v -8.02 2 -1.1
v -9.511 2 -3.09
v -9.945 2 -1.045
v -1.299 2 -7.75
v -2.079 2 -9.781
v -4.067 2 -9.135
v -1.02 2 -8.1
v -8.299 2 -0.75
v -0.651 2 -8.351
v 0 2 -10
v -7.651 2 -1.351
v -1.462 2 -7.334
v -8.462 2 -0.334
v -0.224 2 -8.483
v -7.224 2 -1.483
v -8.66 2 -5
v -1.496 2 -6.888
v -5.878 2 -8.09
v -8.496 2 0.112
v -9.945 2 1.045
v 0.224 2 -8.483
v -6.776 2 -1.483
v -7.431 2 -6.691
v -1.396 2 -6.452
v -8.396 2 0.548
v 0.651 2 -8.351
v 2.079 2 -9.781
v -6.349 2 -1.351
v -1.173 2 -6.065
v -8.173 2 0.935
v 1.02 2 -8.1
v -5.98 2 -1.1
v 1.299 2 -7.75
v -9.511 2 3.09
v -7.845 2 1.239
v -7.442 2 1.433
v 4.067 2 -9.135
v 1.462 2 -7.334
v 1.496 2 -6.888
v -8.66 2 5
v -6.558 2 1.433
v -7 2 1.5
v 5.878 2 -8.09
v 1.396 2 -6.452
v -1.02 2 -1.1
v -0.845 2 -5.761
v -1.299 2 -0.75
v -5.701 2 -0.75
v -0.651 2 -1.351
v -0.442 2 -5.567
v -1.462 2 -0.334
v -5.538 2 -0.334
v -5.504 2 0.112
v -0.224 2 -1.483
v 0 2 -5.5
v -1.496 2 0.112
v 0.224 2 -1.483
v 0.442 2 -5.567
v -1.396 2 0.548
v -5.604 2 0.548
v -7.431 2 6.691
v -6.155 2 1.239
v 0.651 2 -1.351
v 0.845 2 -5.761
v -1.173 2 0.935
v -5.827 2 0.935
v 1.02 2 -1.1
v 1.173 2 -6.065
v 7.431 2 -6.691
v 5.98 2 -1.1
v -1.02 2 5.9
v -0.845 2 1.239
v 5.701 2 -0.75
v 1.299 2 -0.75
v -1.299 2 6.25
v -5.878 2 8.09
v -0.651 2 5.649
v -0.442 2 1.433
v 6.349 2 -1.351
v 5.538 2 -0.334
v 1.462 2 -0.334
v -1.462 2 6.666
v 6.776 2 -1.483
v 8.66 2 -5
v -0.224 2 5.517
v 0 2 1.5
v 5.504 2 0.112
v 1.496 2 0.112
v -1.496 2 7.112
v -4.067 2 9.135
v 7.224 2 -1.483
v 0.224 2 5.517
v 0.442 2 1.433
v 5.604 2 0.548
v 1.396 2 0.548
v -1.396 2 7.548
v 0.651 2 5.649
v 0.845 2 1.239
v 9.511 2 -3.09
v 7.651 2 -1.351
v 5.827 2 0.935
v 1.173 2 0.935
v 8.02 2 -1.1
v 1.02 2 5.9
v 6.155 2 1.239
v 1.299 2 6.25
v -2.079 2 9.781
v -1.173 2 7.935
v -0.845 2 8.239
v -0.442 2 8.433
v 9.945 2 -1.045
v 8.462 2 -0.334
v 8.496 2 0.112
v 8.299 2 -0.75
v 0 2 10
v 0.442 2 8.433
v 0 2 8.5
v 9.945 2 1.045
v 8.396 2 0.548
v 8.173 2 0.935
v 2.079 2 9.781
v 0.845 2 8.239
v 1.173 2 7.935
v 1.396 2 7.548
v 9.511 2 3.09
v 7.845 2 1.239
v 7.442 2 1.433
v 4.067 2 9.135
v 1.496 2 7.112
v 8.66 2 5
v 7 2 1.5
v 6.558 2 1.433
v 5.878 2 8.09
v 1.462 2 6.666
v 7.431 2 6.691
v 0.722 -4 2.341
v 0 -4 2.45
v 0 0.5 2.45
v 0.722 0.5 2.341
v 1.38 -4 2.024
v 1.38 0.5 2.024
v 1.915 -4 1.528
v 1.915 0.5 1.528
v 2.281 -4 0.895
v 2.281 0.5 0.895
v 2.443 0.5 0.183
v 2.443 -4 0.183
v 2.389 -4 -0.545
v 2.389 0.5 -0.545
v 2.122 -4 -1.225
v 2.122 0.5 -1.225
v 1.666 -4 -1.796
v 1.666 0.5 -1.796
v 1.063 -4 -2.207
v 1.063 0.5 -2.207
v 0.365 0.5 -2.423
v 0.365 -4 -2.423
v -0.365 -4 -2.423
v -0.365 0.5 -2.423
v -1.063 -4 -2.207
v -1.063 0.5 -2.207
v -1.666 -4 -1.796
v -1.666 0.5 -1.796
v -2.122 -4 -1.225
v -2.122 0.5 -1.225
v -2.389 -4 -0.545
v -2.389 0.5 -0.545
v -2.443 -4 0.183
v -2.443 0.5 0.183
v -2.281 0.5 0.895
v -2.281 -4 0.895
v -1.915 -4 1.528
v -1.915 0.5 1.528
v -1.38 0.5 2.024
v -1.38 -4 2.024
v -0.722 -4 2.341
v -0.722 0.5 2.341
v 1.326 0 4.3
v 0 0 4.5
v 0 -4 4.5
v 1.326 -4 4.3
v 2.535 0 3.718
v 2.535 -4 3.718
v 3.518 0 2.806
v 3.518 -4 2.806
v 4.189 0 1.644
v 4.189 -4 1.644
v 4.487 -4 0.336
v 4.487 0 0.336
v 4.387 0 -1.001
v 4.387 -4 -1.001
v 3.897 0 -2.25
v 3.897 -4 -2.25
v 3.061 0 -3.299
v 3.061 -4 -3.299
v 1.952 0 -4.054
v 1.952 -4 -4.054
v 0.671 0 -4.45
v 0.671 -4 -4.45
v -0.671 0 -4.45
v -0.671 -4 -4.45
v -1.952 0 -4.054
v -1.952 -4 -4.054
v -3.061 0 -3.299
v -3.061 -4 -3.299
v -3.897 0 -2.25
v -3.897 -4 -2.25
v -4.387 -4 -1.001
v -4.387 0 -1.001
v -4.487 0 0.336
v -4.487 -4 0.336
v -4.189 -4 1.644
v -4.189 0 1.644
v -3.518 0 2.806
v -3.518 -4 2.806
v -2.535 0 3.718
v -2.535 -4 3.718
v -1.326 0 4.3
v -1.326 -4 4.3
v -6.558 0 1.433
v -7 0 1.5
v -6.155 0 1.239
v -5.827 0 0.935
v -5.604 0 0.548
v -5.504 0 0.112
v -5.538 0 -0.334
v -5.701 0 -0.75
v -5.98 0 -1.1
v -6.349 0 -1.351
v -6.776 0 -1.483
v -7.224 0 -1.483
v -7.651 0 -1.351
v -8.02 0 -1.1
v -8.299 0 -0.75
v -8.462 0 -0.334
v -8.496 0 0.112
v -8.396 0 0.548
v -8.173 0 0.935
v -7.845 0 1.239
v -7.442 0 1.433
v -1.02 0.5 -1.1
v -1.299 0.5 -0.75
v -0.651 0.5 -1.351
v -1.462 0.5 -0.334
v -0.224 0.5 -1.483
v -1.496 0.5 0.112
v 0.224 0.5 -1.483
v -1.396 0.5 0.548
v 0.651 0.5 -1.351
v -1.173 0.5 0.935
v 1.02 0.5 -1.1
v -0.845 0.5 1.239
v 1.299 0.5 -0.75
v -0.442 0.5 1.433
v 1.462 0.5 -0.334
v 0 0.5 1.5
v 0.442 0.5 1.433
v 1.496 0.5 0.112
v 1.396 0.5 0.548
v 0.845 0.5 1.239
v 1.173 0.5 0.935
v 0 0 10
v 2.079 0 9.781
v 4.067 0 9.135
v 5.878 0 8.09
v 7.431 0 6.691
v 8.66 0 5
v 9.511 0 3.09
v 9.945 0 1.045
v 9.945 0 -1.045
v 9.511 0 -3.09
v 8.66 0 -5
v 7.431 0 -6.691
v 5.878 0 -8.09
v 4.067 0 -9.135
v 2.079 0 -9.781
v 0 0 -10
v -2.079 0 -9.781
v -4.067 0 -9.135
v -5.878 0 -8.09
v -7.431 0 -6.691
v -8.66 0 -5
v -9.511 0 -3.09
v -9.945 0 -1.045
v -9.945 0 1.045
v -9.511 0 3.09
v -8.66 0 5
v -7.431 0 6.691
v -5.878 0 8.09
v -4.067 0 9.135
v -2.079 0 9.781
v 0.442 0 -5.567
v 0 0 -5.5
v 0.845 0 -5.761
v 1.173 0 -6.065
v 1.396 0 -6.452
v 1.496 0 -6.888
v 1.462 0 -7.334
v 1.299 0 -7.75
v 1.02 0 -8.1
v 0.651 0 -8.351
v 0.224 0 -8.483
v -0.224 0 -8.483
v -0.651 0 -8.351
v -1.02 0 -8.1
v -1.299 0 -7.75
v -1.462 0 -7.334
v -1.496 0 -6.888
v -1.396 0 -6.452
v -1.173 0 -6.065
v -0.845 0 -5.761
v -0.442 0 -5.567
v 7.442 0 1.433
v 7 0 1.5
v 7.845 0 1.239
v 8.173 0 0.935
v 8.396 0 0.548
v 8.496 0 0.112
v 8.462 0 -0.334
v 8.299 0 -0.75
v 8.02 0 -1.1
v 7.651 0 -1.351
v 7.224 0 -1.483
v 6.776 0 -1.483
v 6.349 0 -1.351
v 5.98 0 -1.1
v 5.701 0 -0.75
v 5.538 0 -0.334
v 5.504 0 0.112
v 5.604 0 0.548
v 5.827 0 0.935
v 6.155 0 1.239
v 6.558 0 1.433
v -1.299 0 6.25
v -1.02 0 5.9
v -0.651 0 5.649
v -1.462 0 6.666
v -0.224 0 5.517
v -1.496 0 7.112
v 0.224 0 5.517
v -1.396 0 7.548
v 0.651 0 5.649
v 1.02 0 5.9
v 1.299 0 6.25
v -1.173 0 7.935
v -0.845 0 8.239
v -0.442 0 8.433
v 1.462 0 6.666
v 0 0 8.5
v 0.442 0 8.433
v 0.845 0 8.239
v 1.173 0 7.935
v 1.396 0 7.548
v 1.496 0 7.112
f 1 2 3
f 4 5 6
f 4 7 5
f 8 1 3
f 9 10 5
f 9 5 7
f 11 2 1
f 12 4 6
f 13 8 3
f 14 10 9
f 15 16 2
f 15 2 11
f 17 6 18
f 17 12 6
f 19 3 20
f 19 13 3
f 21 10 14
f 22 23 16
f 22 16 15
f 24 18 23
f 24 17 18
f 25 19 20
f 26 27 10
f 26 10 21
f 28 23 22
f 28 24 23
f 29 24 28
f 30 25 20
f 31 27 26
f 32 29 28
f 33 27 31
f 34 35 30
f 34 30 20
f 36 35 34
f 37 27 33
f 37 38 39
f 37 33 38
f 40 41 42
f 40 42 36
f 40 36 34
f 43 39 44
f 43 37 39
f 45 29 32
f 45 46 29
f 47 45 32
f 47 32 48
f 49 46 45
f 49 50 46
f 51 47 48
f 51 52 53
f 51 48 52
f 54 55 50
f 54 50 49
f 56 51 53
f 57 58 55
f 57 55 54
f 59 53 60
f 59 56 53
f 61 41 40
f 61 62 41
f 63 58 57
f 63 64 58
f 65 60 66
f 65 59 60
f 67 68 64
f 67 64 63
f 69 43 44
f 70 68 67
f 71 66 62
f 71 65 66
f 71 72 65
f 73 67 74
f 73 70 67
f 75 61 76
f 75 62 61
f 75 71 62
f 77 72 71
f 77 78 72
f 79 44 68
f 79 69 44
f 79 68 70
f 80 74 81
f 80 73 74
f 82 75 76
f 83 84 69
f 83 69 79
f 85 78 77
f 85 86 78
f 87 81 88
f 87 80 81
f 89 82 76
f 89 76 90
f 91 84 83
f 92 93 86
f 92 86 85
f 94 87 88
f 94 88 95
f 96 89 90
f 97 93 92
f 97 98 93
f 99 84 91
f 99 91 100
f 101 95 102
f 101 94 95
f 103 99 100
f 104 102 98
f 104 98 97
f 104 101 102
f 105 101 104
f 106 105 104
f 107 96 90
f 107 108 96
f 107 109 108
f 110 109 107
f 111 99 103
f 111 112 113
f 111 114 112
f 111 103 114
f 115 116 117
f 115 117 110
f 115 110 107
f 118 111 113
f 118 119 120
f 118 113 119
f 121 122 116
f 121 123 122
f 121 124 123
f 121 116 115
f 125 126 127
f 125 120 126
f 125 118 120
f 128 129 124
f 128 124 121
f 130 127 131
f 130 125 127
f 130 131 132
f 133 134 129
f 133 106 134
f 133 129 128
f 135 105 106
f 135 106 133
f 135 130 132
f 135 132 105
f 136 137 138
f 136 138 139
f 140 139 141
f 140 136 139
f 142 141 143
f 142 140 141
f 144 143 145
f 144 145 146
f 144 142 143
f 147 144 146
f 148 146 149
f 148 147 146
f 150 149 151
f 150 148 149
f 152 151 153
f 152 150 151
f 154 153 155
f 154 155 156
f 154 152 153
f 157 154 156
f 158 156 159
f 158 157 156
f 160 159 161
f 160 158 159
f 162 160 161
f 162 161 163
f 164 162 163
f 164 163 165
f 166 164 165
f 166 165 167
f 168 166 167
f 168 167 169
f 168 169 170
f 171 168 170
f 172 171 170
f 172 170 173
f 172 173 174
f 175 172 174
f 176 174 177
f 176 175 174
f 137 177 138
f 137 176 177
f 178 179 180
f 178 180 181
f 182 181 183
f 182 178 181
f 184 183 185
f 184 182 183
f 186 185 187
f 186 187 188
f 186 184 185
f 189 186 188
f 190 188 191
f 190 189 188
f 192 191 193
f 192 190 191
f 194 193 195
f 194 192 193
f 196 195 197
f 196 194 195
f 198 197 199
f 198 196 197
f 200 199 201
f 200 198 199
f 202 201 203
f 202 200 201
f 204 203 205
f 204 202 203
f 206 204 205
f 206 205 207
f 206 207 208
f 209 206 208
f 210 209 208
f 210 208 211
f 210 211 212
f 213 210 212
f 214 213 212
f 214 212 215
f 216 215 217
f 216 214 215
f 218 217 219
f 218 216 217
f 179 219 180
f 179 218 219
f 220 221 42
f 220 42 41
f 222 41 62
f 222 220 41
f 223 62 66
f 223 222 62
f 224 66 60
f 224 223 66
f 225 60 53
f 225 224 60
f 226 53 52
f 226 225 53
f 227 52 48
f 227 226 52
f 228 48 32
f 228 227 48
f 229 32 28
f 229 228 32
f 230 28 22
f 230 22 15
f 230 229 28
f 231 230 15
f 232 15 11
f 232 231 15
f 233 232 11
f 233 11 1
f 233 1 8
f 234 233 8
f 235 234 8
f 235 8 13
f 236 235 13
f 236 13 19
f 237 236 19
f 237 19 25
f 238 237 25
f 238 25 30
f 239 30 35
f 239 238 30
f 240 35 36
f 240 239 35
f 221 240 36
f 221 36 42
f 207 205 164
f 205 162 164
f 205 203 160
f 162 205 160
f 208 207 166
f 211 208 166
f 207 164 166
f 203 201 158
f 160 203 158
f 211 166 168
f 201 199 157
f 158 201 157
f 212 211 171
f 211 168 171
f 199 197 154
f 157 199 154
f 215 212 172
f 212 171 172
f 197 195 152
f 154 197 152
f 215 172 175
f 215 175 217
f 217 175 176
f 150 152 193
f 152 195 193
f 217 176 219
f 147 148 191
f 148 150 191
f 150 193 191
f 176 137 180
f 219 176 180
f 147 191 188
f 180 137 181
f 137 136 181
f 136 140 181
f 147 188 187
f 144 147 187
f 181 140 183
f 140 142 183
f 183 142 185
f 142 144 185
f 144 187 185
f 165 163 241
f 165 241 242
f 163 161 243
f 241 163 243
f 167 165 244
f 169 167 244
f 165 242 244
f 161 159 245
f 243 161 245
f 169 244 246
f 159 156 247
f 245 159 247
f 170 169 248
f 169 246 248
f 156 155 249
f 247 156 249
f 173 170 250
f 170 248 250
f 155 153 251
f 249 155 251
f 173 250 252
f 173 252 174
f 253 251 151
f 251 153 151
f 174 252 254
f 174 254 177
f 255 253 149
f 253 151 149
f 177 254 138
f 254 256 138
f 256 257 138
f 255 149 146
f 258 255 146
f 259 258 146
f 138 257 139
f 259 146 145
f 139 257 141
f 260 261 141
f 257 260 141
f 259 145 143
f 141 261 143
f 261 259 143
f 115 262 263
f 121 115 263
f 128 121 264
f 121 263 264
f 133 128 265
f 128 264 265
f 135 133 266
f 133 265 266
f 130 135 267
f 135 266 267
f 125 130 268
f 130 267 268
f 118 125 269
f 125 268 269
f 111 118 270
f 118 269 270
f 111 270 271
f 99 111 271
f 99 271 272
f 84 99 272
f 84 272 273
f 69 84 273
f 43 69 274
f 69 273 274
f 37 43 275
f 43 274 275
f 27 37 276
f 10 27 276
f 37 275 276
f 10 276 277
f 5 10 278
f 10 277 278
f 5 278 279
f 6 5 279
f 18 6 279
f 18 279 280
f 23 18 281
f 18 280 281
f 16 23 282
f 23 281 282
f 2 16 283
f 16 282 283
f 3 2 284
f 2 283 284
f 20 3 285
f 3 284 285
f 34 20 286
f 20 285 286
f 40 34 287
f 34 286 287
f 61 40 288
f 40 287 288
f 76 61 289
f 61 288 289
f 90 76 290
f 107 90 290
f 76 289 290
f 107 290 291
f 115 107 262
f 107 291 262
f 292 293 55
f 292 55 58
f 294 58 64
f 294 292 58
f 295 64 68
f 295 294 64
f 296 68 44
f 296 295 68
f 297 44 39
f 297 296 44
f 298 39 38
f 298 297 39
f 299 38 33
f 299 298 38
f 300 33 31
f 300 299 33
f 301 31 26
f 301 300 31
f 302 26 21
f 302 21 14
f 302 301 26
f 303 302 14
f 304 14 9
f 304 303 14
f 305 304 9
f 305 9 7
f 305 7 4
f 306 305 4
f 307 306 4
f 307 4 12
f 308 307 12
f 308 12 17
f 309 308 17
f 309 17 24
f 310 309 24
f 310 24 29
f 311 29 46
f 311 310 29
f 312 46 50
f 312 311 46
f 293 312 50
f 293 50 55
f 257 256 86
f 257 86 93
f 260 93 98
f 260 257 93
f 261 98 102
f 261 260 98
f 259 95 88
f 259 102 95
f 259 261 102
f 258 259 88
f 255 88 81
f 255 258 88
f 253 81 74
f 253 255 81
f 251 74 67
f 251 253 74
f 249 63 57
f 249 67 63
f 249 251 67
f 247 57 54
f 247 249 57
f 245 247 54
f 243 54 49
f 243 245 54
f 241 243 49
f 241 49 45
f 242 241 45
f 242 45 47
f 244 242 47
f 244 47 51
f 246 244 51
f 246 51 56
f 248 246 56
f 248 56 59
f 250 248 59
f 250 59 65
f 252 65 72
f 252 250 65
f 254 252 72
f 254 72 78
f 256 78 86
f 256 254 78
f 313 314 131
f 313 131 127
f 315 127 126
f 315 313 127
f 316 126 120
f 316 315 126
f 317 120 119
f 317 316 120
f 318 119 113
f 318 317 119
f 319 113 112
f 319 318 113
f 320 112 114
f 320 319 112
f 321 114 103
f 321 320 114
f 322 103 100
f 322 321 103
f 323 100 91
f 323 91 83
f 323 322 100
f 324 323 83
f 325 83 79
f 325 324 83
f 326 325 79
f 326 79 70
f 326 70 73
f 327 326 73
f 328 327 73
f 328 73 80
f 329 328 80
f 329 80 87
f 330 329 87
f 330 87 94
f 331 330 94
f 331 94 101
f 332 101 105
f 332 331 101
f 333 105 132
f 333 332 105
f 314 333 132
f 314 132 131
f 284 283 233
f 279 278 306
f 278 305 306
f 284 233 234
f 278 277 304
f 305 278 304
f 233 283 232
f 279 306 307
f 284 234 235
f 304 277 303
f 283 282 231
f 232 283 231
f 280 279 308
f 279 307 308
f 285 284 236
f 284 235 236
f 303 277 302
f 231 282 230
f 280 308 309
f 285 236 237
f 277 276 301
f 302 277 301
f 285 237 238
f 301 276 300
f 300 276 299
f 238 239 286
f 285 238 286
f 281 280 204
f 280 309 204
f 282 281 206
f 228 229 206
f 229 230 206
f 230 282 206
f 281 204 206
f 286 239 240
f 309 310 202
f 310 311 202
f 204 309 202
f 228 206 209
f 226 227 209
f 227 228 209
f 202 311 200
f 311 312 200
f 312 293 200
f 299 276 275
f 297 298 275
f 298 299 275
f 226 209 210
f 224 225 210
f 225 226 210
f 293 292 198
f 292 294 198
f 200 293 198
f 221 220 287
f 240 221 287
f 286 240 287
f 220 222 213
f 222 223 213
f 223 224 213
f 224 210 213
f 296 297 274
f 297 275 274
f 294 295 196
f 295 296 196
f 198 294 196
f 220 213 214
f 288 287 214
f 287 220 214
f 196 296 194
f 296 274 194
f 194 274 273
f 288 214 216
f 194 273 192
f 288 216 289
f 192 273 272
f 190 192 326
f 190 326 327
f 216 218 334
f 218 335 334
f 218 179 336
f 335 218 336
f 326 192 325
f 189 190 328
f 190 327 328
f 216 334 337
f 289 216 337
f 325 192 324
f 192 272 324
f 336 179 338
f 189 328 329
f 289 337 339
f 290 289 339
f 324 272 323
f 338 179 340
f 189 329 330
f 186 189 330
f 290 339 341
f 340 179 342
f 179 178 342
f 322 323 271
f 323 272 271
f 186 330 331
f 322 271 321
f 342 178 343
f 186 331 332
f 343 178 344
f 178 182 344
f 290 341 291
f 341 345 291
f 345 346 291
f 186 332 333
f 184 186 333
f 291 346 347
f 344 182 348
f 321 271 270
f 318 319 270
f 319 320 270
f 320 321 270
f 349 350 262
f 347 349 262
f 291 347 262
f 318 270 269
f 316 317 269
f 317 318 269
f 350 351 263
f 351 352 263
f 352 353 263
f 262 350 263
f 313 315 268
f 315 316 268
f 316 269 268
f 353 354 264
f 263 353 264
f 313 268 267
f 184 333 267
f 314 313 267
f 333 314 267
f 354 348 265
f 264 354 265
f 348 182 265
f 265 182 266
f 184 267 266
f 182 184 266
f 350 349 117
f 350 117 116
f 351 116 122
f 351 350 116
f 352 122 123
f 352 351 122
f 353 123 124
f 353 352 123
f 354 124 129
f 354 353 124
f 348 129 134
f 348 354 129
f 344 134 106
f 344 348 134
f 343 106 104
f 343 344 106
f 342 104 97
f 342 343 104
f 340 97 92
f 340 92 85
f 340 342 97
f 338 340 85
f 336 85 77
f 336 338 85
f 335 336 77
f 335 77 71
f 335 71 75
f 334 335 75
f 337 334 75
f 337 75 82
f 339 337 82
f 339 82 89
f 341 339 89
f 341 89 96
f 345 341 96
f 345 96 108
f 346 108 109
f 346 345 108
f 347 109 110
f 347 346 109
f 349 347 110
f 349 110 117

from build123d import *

# Parameters (mm, degrees)
SKETCH_1_R               = 10
SKETCH_1_R_2             = 1.5
EXTRUDE_1_DEPTH          = 2
SKETCH_2_R               = 4.5
EXTRUDE_2_DEPTH          = 4
CUT_EXTRUDE_1_DEPTH      = 15.696938457
CUT_EXTRUDE_1_DEPTH_BACK = 15.696938457
SKETCH_3_R               = 1.5
CUT_EXTRUDE_START        = -4
SKETCH_4_R               = 2.45
CUT_EXTRUDE_2_DEPTH      = 4.5


with BuildPart() as part:
    # 草图1 → 凸台-拉伸1 (new body)
    with BuildSketch(Plane(origin=(0, 0, 0), x_dir=(1, 0, 0), z_dir=(0, 1, 0))):
        with Locations(Location((0, 0, 0), (0, 0, 270))):
            Circle(SKETCH_1_R)
        with Locations(Location((0, 7, 0), (0, 0, 270))):
            Circle(SKETCH_1_R_2, mode=Mode.SUBTRACT)
        with Locations(Location((7, 0, 0), (0, 0, 270))):
            Circle(SKETCH_1_R_2, mode=Mode.SUBTRACT)
        with Locations(Location((0, -7, 0), (0, 0, 270))):
            Circle(SKETCH_1_R_2, mode=Mode.SUBTRACT)
        with Locations(Location((-7, 0, 0), (0, 0, 270))):
            Circle(SKETCH_1_R_2, mode=Mode.SUBTRACT)
    extrude(amount=EXTRUDE_1_DEPTH)

    # 草图2 → 凸台-拉伸2 (add)
    with BuildSketch(Plane(origin=(0, 0, 0), x_dir=(1, 0, 0), z_dir=(0, 1, 0))):
        with Locations(Location((0, 0, 0), (0, 0, 270))):
            Circle(SKETCH_2_R)
    extrude(amount=-EXTRUDE_2_DEPTH)

    # 草图3 → 切除-拉伸1 (cut, two sides: drawn at the far end of the back side and taken through both)
    with BuildSketch(Plane(origin=(0, 0, 0), x_dir=(1, 0, 0), z_dir=(0, 1, 0)).offset(-CUT_EXTRUDE_1_DEPTH_BACK)):
        with Locations(Location((0, 0, 0), (0, 0, 270))):
            Circle(SKETCH_3_R)
    extrude(amount=CUT_EXTRUDE_1_DEPTH + CUT_EXTRUDE_1_DEPTH_BACK, mode=Mode.SUBTRACT)

    # 草图4 → 切除-拉伸2 (cut)
    with BuildSketch(Plane(origin=(0, 0, 0), x_dir=(1, 0, 0), z_dir=(0, 1, 0)).offset(CUT_EXTRUDE_START)):
        with Locations(Location((0, 0, 0), (0, 0, 270))):
            Circle(SKETCH_4_R)
    extrude(amount=CUT_EXTRUDE_2_DEPTH, mode=Mode.SUBTRACT)


solid = part.part
